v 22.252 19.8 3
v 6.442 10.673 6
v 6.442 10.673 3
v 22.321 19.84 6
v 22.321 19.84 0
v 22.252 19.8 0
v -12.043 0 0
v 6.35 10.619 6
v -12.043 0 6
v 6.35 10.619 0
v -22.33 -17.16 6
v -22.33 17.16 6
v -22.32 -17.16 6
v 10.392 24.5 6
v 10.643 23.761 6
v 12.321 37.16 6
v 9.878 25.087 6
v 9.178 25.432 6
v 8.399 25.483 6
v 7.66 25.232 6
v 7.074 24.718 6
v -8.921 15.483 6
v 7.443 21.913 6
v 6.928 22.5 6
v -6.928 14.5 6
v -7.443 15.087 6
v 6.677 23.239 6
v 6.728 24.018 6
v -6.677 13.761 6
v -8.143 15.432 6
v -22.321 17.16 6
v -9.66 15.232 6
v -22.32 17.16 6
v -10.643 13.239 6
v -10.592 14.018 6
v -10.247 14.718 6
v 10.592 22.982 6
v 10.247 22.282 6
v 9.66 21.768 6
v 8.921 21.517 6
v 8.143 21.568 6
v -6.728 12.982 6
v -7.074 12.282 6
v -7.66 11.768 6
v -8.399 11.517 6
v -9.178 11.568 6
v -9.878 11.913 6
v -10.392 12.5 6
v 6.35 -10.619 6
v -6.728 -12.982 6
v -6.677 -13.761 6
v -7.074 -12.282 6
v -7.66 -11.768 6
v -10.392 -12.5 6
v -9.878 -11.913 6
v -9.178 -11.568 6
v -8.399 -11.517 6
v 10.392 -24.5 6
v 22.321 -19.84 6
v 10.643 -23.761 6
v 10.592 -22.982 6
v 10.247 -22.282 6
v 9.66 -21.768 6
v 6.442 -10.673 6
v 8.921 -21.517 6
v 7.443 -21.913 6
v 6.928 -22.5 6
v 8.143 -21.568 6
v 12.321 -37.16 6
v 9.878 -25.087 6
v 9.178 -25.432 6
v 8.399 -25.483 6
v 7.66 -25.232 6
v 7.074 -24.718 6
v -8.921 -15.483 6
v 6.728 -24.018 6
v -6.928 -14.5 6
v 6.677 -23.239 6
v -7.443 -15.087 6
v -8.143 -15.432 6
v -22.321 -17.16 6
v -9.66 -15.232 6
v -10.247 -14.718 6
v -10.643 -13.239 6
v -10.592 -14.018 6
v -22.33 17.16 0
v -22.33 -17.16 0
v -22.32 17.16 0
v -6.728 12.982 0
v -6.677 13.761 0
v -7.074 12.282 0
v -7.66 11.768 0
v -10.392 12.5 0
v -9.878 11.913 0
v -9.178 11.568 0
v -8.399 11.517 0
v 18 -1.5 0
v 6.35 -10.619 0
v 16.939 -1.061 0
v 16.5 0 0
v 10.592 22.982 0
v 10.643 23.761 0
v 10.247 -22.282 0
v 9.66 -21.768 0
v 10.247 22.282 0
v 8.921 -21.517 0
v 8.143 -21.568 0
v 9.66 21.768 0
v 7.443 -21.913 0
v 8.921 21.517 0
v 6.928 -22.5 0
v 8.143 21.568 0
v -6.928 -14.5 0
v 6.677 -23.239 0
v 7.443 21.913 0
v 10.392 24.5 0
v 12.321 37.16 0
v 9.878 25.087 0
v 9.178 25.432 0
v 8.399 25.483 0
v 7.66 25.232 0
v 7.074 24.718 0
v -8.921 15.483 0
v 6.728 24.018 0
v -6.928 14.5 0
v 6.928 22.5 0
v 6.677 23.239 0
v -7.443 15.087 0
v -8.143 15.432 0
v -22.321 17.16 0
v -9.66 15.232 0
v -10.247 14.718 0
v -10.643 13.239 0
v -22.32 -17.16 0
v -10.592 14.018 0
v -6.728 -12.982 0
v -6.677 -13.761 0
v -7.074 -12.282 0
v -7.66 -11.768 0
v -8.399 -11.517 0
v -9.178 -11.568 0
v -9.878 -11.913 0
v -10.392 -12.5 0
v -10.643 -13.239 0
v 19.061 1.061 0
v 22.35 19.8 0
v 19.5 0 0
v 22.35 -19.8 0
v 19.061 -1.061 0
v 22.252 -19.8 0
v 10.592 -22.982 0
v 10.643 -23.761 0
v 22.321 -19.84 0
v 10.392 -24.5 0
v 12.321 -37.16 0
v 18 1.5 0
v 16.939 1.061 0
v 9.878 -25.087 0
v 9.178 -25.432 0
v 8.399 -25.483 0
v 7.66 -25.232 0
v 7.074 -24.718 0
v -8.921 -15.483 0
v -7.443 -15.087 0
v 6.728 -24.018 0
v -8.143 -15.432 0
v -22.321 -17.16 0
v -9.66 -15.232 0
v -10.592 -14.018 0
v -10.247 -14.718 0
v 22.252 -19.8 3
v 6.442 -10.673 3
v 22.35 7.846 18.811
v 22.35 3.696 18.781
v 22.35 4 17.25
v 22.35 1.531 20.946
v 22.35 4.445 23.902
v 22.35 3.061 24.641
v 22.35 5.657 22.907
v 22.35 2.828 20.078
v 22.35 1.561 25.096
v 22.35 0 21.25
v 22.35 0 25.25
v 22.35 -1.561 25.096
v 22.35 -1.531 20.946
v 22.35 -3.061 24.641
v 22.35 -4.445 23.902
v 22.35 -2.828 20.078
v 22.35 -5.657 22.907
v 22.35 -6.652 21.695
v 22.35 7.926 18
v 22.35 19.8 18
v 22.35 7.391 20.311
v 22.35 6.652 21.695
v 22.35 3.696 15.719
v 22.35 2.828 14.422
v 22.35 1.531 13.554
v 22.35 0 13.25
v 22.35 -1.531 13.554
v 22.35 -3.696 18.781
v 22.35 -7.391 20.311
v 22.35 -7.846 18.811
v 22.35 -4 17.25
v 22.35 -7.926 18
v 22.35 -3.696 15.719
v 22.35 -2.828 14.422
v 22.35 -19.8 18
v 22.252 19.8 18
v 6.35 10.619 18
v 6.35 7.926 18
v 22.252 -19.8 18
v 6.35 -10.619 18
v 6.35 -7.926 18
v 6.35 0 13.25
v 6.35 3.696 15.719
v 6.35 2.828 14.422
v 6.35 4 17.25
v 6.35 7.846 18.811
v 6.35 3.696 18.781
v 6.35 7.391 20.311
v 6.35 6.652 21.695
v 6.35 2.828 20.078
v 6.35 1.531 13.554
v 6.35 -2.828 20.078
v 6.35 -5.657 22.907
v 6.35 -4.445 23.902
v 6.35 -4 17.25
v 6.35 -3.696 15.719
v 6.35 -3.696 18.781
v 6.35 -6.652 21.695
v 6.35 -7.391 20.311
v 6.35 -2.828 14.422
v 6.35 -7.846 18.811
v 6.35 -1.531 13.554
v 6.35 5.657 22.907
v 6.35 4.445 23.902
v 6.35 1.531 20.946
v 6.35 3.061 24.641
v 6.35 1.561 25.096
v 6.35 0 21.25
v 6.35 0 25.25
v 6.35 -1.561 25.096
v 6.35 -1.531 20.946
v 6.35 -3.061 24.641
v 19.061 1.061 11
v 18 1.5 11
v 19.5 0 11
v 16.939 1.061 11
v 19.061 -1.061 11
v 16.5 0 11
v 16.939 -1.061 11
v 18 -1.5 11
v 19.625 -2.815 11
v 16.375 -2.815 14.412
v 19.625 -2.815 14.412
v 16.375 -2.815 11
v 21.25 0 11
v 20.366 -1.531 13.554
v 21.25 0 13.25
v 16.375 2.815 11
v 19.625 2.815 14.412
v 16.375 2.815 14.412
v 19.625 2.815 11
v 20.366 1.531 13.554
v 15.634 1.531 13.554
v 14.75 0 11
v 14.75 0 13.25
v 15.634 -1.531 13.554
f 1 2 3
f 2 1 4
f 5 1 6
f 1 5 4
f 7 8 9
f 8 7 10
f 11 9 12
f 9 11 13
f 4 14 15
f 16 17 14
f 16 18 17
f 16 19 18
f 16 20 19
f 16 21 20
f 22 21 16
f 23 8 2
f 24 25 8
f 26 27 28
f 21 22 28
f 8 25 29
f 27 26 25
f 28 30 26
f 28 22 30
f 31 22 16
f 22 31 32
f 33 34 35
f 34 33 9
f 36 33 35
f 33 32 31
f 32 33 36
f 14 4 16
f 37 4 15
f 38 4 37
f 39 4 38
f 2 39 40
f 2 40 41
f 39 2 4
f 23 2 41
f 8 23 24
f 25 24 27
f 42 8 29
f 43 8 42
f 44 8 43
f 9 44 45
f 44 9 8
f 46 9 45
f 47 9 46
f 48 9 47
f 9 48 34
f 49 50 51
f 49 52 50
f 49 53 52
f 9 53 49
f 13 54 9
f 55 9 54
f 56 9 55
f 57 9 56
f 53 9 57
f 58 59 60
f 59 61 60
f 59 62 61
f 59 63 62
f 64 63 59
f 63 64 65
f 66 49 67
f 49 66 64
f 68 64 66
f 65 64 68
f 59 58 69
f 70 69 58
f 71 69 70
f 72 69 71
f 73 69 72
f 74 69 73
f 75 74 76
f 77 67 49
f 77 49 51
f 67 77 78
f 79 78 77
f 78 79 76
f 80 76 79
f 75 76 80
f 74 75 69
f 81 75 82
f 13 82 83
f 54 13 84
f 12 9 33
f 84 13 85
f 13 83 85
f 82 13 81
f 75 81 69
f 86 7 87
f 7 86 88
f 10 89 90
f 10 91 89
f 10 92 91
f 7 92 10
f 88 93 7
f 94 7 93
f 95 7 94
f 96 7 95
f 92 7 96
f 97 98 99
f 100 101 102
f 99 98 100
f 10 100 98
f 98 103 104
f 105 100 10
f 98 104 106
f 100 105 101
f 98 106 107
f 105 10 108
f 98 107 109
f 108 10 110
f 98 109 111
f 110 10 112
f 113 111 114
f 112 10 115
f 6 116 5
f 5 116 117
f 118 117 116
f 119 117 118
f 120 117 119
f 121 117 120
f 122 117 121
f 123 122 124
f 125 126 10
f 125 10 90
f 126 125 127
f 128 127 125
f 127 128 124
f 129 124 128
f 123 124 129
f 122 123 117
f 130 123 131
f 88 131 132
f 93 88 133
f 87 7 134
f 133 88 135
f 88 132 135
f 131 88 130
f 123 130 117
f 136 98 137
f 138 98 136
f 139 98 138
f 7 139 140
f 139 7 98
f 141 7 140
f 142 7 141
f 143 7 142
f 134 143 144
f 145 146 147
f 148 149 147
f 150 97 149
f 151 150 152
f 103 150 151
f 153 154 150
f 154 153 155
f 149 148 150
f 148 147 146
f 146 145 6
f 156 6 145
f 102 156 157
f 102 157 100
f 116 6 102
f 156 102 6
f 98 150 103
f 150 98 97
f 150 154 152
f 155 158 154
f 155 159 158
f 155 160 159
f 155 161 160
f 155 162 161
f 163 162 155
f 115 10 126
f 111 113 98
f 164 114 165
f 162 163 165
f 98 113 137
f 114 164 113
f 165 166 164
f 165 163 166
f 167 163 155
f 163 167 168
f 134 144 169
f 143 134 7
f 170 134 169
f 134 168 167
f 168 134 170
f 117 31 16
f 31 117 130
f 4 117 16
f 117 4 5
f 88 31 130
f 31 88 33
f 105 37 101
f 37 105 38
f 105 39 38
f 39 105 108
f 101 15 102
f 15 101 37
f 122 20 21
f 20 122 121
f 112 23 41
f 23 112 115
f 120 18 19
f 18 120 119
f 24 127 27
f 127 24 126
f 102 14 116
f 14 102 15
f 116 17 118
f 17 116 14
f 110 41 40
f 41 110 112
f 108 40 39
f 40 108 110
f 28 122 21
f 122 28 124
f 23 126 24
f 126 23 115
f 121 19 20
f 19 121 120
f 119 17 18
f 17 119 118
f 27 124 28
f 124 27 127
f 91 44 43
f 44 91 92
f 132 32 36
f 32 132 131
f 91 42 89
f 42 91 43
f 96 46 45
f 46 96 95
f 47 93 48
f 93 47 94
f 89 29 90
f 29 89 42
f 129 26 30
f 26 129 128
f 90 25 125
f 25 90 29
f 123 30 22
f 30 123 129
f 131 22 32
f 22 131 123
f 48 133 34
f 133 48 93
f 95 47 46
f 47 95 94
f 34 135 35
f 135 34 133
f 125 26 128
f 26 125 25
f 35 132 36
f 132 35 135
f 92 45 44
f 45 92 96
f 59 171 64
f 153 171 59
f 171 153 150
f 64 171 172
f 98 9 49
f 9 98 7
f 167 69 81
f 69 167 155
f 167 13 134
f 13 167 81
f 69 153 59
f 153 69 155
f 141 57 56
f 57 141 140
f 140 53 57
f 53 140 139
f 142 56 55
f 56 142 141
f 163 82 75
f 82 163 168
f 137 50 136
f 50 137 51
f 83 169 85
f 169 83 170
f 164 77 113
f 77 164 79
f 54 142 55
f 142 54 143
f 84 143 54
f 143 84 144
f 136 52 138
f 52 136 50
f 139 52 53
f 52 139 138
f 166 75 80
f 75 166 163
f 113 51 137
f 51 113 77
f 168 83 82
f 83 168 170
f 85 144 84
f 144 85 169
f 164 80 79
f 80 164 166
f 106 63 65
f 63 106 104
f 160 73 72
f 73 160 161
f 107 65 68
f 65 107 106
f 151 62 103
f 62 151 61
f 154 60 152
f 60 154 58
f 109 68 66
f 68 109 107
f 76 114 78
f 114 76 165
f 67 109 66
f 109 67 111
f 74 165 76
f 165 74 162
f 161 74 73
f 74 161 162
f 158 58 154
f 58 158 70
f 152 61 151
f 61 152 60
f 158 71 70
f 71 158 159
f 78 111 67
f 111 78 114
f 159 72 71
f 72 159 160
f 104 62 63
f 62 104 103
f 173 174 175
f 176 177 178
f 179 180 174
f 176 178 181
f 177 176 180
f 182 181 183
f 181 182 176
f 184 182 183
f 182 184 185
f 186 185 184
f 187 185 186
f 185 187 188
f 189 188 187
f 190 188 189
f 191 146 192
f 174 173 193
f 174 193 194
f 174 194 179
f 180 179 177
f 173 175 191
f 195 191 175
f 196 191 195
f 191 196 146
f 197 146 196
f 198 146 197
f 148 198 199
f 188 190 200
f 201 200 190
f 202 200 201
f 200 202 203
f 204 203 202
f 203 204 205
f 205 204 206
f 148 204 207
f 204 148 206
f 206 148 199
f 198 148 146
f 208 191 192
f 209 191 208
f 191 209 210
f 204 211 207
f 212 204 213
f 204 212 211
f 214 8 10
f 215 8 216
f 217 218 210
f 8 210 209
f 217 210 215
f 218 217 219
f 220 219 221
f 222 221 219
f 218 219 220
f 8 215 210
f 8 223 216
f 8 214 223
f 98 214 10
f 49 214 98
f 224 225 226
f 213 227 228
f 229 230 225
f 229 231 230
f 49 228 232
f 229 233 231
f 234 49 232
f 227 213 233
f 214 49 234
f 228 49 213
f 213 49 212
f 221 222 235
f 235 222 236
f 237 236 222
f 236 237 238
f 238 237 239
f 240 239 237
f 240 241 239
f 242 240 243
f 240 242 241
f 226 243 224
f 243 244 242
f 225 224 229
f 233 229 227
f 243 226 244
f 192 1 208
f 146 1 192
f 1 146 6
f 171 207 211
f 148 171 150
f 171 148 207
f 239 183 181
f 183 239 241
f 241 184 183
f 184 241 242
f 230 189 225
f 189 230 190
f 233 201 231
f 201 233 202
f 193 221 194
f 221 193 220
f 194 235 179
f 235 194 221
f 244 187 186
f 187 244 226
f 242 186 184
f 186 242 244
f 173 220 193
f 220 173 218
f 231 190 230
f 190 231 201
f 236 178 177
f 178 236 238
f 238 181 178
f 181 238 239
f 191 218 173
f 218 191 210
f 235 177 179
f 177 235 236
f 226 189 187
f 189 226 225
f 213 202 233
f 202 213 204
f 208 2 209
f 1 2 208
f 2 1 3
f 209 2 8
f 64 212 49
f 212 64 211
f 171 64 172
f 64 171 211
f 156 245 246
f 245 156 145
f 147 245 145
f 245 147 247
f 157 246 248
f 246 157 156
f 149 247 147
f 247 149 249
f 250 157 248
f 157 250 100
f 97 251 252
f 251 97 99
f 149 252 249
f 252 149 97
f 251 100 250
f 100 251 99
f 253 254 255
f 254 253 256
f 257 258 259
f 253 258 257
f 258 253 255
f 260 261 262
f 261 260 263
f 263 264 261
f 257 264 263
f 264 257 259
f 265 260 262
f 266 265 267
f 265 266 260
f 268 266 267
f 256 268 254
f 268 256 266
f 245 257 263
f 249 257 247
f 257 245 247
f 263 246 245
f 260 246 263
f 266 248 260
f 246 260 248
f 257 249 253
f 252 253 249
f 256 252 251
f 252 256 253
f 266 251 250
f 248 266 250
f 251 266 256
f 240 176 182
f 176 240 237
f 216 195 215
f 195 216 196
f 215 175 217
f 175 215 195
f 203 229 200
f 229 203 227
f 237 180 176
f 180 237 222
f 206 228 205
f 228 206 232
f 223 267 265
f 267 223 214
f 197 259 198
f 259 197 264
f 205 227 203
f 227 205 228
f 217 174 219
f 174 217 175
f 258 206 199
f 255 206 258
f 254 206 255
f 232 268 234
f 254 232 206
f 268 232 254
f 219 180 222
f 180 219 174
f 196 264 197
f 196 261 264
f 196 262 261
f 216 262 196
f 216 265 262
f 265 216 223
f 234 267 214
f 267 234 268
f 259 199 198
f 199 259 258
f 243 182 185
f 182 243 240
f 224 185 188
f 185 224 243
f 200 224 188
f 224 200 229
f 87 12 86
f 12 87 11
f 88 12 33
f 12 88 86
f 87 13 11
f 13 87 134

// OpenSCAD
for( i = [-1,1] )
translate( [ 0,-i * 18.5,0 ] )
rotate( [0,0,i*60] ) {
    difference() { 
        translate( [ 0,0,3 ] ) cube( size = [20,40,6], center=true );
        translate( [ 0,10,-1 ] ) cylinder( r = 2, h = 8, $fn = 16 );
        translate( [ 0,-10,-1 ] ) cylinder( r = 2, h = 8, $fn = 16 );
    }
}
translate( [ -17.33,0,3 ] ) cube( size = [10,34.32,6], center=true );

difference() {
union() {
translate( [ 14.35,0,9 ] ) cube( size = [16,39.6,18], center=true );
translate( [ 6.35,0,17.25 ] ) rotate( [0,90,0] ) cylinder( r = 8, h = 16, $fn = 32 );
}
translate( [ 18,0,-1 ] ) cylinder( r = 1.5, h = 19, $fn = 8 );
translate( [ 18,0,11 ] ) cylinder( r = 3.25, h = 4, $fn = 6 );
translate( [ 1,0,17.25 ] ) rotate( [0,90,0] ) cylinder( r = 4, h = 22, $fn = 16 );
for( i = [-1,1] )
translate( [ 0,-i * 18.5,0 ] ) rotate( [0,0,i*60] ) translate( [ 0,0,13 ] ) cube( size = [20,40,20], center=true );
}
